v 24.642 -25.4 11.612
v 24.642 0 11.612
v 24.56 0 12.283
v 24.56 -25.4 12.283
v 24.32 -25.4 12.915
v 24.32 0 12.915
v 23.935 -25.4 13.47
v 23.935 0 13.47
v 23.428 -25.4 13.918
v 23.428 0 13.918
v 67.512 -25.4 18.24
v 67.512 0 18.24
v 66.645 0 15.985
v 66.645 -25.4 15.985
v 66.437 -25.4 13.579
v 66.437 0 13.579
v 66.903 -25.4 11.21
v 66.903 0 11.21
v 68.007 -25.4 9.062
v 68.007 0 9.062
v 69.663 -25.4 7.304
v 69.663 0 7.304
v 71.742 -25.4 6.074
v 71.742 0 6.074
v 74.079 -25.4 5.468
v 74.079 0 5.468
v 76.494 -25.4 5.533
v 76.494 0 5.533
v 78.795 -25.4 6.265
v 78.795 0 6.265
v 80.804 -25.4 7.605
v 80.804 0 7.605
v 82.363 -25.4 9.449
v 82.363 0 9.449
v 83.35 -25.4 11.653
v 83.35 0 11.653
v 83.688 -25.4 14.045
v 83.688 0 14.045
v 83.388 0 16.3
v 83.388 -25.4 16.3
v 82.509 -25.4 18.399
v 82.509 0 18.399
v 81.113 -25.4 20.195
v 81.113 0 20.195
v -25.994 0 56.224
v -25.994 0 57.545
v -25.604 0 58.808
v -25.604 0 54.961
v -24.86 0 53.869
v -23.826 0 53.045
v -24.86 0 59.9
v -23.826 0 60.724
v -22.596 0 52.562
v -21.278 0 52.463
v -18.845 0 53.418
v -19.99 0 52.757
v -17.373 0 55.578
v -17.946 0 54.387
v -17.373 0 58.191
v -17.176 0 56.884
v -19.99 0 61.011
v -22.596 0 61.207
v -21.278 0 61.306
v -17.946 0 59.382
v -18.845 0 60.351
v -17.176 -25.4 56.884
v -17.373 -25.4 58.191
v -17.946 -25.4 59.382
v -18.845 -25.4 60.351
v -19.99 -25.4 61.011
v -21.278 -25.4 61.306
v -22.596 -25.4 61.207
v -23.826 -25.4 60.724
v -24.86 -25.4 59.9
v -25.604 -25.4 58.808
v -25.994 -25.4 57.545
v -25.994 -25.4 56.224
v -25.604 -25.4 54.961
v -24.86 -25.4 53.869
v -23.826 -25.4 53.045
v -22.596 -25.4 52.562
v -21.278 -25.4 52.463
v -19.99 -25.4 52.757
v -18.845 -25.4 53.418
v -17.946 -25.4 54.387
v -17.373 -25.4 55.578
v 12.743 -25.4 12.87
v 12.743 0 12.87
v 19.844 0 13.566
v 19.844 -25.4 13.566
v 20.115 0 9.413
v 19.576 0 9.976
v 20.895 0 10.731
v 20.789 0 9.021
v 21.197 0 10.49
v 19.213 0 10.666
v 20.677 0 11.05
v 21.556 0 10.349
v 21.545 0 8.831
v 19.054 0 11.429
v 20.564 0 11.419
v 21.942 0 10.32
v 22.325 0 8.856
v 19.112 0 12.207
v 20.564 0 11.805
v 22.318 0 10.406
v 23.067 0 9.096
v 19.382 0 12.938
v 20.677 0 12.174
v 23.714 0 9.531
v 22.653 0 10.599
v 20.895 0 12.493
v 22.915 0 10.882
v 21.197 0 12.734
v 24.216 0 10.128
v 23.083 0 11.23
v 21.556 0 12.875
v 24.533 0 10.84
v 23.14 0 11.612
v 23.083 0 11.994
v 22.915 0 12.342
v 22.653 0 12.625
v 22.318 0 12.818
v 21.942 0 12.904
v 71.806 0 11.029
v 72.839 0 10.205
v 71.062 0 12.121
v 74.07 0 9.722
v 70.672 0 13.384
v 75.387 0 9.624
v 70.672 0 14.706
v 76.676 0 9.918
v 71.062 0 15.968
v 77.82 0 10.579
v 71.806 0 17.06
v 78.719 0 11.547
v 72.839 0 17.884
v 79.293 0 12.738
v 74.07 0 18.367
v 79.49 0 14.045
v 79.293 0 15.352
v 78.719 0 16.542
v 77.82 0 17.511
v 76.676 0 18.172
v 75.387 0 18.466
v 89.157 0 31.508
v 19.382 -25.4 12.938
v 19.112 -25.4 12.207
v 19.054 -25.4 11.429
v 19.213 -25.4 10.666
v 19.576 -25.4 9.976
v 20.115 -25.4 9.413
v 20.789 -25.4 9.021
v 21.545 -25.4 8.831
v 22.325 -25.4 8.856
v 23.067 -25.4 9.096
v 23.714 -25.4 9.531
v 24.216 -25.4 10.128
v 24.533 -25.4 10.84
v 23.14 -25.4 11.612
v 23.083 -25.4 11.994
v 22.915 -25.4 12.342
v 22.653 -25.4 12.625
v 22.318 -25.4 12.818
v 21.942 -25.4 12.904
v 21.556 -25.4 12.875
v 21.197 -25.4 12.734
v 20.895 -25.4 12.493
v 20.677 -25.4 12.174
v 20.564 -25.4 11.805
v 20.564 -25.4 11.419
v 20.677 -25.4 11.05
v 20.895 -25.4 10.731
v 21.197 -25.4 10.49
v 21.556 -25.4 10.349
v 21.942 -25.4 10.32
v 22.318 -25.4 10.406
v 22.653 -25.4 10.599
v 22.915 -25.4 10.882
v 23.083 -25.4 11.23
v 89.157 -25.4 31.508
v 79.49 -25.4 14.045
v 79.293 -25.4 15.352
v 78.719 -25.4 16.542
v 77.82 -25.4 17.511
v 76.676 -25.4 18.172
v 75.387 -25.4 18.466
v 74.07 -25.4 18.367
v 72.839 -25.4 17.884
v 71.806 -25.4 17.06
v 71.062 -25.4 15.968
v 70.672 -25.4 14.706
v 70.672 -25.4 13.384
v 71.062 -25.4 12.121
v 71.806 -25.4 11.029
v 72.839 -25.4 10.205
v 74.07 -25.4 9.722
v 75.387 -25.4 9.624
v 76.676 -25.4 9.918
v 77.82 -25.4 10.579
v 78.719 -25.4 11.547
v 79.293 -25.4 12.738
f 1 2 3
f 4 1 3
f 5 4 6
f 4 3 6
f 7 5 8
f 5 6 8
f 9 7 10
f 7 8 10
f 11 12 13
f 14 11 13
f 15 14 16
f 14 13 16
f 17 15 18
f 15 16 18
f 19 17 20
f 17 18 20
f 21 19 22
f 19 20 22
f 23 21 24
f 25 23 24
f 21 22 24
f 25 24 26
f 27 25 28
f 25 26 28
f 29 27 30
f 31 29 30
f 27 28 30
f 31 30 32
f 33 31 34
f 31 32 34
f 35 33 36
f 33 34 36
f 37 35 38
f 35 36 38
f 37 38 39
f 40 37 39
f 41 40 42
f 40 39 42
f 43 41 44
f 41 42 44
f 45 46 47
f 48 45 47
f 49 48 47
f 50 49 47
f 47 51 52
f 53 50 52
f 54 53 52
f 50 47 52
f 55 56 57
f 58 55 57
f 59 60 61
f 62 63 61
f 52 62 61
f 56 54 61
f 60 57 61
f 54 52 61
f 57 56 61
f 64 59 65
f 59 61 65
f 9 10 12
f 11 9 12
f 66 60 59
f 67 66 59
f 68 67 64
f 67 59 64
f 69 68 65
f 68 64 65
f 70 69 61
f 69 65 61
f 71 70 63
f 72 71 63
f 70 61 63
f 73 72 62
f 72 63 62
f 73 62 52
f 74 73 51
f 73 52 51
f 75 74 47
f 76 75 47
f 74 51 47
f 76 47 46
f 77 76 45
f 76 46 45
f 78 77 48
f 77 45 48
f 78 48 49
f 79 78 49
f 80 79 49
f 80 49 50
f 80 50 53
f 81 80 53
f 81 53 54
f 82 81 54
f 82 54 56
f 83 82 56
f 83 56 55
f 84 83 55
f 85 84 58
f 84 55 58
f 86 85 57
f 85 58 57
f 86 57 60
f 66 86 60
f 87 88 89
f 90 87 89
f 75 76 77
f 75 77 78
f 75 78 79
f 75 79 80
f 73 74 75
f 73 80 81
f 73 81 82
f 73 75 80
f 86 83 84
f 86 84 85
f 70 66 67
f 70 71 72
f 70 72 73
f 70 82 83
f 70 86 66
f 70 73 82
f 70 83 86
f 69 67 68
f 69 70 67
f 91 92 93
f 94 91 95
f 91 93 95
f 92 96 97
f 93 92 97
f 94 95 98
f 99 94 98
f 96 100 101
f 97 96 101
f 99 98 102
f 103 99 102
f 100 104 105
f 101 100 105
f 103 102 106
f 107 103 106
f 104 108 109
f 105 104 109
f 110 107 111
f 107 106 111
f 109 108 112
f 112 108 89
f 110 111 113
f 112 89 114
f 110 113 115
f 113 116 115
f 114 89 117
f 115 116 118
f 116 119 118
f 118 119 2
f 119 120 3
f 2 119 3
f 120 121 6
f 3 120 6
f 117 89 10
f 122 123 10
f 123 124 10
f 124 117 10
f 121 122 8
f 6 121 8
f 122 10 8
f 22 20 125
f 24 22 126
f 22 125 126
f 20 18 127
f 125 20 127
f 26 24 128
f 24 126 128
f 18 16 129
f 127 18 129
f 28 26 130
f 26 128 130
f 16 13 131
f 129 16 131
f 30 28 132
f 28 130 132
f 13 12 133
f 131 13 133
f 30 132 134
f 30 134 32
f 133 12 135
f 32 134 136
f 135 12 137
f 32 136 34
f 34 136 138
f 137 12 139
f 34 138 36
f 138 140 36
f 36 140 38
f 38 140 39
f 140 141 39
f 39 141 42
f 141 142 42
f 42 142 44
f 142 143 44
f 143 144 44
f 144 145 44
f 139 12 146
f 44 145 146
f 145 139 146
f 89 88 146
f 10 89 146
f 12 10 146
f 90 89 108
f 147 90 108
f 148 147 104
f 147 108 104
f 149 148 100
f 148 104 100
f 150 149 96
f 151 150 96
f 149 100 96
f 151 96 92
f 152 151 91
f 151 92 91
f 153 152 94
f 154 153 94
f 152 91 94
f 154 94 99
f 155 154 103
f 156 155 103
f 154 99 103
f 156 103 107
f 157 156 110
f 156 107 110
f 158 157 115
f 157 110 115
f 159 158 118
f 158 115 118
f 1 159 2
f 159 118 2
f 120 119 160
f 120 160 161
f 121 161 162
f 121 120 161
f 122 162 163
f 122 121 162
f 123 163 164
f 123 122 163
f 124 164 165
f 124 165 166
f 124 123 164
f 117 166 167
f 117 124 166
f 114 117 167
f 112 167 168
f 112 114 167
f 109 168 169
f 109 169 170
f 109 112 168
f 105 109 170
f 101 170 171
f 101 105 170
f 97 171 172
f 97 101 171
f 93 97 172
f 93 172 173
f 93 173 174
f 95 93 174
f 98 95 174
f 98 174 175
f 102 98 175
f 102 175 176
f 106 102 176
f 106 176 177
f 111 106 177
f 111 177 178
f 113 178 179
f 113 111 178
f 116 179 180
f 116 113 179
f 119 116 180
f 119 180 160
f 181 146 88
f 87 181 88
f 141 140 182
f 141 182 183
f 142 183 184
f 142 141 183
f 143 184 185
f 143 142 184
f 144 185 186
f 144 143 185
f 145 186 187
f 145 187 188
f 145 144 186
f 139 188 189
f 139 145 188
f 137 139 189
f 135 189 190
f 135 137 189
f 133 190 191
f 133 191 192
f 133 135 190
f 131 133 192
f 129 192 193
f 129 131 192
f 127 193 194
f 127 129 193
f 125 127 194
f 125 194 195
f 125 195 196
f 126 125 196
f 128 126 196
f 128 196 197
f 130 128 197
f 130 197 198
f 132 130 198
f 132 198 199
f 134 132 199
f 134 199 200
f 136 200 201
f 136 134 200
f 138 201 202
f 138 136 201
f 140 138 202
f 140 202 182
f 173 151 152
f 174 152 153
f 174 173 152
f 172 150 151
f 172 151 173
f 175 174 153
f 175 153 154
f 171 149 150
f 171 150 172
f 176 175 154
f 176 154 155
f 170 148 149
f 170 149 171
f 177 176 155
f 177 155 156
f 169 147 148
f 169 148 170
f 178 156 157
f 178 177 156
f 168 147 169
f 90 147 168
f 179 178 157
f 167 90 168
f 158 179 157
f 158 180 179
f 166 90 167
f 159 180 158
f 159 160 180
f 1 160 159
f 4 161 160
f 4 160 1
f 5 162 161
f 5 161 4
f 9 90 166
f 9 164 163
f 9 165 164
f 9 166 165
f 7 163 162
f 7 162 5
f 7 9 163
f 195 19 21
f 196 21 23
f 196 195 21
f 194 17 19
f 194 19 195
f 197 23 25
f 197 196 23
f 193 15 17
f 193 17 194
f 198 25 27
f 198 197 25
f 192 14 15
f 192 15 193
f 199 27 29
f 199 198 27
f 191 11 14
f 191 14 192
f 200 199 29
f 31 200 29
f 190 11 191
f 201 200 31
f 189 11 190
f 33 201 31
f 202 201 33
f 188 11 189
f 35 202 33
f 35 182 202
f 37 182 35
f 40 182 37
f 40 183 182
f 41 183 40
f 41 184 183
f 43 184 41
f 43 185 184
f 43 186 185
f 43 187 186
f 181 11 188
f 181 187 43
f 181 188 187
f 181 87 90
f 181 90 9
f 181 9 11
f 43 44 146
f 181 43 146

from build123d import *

# Parameters (mm, degrees)
F0_R     = 1.2955888687
F0_R_2   = 4.4335115967
F1_DEPTH = 25.4


with BuildPart() as f1:
    # F0 (on Front) → F1 (new body)
    with BuildSketch(Plane.XZ):
        with BuildLine():
            Line((89.1572237015, 31.5077528358), (12.7428583801, 12.8701059148))
            Line((12.7428583801, 12.8701059148), (19.8439891704, 13.5662951334))
            ThreePointArc((19.8439891704, 13.5662951334), (21.5718320787, 14.3954167349), (23.4278013561, 13.9176492317))
            Line((23.4278013561, 13.9176492317), (67.5118393184, 18.2396132754))
            ThreePointArc((67.5118393184, 18.2396132754), (73.8275336357, 22.5889714613), (81.112807161, 20.1952920757))
            Line((81.112807161, 20.1952920757), (89.1572237015, 31.5077528358))
        make_face()
        with BuildLine():
            ThreePointArc((23.4278013561, 13.9176492317), (21.5718320787, 14.3954167349), (19.8439891704, 13.5662951334))
            Line((19.8439891704, 13.5662951334), (23.4278013561, 13.9176492317))
        make_face()
        with BuildLine():
            Line((23.4278013561, 13.9176492317), (19.8439891704, 13.5662951334))
            ThreePointArc((19.8439891704, 13.5662951334), (20.7894933235, 9.0214762693), (24.6417307995, 11.6117702758))
            ThreePointArc((24.6417307995, 11.6117702758), (24.3197112814, 12.9147190903), (23.4278013561, 13.9176492317))
        make_face()
        with Locations((21.8447385651, 11.6117702758)):
            Circle(F0_R, mode=Mode.SUBTRACT)
        with BuildLine():
            ThreePointArc((83.6881530447, 14.0447923914), (83.0183282504, 17.3787484794), (81.112807161, 20.1952920757))
            Line((81.112807161, 20.1952920757), (80.6371569633, 19.5264089853))
            Line((80.6371569633, 19.5264089853), (67.5118393184, 18.2396132754))
            ThreePointArc((67.5118393184, 18.2396132754), (72.8893138351, 5.6891109706), (83.6881530447, 14.0447923914))
        make_face()
        with Locations((75.0560984015, 14.0447923914)):
            Circle(F0_R_2, mode=Mode.SUBTRACT)
        with BuildLine():
            Line((80.6371569633, 19.5264089853), (81.112807161, 20.1952920757))
            ThreePointArc((81.112807161, 20.1952920757), (73.8275336357, 22.5889714613), (67.5118393184, 18.2396132754))
            Line((67.5118393184, 18.2396132754), (80.6371569633, 19.5264089853))
        make_face()
    extrude(amount=F1_DEPTH)


with BuildPart() as f1b:
    # F0 (on Front) → F1, piece 2 (new body)
    with BuildSketch(Plane.XZ):
        with Locations((-21.6095242649, 56.8844042718)):
            Circle(F0_R_2)
    extrude(amount=F1_DEPTH)


solid = Compound([f1.part, f1b.part])
